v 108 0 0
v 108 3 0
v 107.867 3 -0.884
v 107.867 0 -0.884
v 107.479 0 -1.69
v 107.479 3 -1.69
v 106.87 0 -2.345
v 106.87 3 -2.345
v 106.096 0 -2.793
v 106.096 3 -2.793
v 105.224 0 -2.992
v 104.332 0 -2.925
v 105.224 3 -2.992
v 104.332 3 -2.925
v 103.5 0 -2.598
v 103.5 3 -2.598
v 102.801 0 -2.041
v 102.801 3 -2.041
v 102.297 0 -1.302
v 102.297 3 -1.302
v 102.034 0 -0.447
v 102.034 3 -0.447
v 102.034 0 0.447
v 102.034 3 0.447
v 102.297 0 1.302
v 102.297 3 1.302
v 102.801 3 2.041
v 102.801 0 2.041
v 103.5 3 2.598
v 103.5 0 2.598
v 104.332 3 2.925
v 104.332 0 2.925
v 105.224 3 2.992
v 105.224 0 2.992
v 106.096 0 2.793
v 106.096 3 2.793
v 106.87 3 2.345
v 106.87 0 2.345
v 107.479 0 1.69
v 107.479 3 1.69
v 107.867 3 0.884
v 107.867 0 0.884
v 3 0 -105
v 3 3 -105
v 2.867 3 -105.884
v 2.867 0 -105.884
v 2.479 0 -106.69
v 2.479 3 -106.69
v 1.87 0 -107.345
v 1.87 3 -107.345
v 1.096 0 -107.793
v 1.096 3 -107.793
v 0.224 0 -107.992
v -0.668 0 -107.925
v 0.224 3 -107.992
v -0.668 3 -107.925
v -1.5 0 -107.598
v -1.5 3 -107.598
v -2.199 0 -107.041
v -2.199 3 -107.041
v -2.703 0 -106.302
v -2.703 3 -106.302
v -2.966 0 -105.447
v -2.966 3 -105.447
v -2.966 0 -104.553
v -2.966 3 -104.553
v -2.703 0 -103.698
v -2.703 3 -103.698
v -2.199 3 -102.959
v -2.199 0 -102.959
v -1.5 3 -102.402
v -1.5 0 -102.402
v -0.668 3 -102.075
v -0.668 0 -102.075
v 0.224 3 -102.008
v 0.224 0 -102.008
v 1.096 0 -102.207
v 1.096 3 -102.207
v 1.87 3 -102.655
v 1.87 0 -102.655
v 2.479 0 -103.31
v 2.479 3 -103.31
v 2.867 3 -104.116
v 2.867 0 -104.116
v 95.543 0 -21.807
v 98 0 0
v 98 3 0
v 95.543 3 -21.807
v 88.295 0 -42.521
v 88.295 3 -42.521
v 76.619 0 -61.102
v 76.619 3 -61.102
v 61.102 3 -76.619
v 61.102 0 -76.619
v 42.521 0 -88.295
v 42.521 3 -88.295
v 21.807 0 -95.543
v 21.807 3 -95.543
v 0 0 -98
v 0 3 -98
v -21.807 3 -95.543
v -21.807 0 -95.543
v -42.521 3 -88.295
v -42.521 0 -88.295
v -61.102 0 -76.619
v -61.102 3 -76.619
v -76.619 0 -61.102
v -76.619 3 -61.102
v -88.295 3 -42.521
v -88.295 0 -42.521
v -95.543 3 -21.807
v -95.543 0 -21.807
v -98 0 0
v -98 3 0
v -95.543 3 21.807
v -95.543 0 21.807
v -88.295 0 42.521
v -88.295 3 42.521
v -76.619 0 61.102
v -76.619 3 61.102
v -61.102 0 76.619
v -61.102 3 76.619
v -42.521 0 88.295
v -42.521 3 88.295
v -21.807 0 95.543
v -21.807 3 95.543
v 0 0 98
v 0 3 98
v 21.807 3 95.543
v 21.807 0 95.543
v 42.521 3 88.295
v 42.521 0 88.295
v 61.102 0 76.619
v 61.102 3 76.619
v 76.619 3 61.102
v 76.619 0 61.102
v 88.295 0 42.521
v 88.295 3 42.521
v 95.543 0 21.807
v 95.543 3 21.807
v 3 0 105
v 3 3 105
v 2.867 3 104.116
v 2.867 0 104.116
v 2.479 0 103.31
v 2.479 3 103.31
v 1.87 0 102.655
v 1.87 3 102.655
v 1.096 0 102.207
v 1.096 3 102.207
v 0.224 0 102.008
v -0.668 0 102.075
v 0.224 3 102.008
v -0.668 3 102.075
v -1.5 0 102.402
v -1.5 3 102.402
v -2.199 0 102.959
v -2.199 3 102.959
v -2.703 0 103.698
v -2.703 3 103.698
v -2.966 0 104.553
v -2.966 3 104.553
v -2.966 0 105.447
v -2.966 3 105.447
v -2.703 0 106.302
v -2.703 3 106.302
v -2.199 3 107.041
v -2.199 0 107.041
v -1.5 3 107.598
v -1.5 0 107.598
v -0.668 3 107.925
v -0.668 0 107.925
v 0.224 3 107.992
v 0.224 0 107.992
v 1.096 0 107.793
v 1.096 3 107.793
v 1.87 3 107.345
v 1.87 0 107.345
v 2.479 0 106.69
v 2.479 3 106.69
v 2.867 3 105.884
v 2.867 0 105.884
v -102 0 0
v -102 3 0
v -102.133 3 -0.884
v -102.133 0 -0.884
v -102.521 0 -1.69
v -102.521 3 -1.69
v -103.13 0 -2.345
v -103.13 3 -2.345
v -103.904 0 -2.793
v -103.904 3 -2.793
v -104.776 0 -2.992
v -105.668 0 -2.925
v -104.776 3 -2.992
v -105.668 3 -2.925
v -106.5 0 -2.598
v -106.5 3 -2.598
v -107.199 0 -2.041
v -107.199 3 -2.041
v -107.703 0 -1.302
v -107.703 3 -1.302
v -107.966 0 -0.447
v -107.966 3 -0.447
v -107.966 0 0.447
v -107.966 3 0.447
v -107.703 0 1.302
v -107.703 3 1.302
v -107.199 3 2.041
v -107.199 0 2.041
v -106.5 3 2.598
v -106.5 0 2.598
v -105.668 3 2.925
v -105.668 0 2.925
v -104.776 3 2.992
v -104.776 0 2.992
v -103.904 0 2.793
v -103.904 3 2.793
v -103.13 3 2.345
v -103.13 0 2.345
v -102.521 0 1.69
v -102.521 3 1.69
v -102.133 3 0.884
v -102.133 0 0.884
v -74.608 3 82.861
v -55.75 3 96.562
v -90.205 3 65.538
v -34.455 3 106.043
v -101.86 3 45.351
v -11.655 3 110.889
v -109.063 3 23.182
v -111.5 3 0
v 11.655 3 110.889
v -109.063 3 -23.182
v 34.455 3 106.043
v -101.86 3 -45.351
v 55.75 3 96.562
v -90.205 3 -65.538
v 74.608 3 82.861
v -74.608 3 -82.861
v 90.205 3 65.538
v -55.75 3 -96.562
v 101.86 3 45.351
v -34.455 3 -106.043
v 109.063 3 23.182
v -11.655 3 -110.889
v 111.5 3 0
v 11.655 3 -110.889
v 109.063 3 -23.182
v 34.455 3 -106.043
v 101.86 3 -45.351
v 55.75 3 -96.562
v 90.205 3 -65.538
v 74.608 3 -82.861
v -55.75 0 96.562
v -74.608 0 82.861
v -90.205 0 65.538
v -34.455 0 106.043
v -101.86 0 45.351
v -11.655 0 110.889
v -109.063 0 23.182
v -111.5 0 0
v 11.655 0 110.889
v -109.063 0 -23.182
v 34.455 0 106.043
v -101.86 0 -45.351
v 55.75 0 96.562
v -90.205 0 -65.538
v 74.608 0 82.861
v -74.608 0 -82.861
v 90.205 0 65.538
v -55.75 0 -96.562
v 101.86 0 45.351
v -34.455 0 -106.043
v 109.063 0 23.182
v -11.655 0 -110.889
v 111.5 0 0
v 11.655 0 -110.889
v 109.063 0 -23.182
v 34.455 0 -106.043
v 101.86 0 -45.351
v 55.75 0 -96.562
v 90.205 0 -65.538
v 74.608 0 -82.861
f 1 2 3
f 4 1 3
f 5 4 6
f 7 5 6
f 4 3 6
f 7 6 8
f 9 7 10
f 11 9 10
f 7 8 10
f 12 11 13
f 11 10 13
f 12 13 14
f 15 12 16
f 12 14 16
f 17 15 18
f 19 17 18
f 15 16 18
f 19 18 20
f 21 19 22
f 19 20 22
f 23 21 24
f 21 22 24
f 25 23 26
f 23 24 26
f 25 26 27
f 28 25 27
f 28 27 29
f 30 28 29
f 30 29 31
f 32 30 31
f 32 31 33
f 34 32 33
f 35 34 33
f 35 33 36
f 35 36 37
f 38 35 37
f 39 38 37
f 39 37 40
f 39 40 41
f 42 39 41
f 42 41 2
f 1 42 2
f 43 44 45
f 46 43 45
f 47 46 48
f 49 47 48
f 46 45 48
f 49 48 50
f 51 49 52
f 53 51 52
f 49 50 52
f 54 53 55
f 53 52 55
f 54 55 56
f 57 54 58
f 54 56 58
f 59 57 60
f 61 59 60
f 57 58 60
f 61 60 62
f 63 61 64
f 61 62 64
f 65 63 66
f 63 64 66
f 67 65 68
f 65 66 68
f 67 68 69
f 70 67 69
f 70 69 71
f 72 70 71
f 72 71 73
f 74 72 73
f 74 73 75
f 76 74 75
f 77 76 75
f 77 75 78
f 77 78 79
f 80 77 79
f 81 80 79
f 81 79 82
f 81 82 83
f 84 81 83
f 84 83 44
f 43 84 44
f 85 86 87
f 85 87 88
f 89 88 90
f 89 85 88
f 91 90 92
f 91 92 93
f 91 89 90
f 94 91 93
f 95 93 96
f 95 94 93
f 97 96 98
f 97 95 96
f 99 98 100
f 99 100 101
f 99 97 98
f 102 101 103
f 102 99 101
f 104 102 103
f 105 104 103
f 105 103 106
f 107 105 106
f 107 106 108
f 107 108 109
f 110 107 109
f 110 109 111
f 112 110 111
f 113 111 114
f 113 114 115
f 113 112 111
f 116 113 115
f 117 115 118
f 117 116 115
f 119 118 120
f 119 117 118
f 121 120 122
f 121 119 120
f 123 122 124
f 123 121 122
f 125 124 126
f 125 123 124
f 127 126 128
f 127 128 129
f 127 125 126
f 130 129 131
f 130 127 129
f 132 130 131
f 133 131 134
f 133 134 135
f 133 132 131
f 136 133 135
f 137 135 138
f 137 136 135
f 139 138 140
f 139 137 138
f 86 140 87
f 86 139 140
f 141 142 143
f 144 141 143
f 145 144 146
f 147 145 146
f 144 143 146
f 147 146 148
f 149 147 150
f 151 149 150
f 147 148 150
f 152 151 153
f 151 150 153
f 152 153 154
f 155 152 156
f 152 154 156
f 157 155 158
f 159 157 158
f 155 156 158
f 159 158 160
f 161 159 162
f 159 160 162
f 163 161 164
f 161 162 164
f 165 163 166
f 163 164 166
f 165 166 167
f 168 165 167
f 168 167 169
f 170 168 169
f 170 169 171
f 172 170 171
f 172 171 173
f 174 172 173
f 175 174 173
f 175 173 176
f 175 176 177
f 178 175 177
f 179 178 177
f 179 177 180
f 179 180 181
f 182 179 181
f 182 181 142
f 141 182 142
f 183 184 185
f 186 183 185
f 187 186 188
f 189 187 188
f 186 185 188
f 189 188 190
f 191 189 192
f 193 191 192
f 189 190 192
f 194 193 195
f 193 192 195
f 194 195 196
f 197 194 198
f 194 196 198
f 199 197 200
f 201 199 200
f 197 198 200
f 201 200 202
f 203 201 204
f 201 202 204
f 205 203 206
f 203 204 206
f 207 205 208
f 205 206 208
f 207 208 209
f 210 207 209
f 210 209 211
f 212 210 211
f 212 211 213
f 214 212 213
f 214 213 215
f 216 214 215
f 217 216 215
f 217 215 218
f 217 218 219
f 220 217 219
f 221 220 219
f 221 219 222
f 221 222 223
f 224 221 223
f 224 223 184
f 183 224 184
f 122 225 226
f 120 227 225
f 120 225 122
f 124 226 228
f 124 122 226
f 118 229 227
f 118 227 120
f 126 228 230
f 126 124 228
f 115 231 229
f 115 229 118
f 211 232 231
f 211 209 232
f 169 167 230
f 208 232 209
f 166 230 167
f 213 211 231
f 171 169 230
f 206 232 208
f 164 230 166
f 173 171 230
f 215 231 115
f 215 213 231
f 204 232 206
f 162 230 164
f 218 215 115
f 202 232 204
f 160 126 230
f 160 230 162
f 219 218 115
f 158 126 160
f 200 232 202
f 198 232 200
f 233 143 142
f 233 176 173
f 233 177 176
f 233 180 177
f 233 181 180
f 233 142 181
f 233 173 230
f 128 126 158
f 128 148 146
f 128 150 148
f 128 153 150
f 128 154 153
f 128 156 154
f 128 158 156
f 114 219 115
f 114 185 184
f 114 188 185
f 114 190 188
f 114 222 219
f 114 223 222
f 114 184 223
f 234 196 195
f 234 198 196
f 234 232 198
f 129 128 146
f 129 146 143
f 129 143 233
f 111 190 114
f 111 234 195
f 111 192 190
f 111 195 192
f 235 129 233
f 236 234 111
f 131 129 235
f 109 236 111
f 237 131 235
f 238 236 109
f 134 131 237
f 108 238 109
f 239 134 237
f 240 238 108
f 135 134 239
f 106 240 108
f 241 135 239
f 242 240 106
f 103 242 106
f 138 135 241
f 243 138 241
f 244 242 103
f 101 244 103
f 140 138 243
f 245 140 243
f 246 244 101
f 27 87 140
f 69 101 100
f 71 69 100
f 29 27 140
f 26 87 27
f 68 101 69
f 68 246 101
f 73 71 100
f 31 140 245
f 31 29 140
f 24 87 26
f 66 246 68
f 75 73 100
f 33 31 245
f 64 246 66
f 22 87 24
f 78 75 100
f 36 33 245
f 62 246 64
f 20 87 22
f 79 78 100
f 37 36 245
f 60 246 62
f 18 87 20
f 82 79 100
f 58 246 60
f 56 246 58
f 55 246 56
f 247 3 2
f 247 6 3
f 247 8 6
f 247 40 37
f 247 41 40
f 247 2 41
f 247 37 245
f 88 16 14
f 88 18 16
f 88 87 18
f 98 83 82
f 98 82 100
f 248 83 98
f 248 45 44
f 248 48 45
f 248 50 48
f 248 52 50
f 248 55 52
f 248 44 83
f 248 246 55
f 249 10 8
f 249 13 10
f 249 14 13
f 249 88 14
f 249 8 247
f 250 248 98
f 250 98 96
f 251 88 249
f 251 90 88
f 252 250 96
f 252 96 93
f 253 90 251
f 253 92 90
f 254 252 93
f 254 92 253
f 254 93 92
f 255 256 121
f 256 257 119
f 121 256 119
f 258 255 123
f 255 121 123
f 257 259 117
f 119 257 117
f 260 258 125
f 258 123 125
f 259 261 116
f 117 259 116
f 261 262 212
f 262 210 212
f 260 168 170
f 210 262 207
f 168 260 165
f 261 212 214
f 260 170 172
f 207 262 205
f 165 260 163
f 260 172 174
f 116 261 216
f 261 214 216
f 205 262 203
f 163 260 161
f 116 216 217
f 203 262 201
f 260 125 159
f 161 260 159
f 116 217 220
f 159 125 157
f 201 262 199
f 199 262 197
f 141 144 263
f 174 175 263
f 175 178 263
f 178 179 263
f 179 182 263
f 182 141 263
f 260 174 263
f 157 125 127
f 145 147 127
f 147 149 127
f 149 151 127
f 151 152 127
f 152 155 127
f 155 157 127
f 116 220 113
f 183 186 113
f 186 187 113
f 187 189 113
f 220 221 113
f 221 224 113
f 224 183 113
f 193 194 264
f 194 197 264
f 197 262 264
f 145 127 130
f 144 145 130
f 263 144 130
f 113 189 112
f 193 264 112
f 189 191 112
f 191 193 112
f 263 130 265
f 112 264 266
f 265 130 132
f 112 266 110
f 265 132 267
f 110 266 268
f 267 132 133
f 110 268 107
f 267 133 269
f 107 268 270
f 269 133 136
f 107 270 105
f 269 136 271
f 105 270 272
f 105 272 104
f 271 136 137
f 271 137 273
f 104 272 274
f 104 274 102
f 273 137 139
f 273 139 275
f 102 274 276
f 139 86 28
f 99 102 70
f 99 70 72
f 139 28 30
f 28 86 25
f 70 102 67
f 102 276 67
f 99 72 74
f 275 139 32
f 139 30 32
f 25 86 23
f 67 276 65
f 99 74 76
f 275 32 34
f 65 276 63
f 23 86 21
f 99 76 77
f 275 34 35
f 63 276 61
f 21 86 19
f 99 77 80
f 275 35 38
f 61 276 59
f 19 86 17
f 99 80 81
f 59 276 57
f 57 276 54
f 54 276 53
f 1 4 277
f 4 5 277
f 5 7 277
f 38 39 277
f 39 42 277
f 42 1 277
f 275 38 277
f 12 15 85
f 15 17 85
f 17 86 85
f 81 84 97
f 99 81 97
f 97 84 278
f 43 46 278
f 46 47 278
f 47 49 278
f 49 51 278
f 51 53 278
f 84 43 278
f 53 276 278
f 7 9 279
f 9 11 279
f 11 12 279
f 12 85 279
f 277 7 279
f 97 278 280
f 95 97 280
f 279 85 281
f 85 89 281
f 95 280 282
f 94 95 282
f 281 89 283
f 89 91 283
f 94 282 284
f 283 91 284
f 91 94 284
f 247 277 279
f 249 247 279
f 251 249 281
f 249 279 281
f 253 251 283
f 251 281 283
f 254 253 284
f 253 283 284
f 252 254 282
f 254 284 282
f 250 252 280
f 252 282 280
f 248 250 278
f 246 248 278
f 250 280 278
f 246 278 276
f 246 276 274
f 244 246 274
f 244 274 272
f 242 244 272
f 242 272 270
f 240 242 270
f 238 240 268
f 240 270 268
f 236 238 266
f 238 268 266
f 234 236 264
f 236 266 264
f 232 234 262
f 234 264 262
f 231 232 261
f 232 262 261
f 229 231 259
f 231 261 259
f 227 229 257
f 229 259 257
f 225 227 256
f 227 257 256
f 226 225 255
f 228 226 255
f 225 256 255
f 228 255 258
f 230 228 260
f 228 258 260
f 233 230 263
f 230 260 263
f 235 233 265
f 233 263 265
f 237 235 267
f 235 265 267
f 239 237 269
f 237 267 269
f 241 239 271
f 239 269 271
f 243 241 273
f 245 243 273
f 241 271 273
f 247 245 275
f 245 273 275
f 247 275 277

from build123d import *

# Parameters (mm, degrees)
SKETCH1_R           = 111.5
SKETCH1_R_2         = 98
BOSS_EXTRUDE1_DEPTH = 3
SKETCH2_R           = 3
CUT_EXTRUDE1_DEPTH  = 4


with BuildPart() as part:
    # Sketch1 → Boss-Extrude1 (new body)
    with BuildSketch(Plane(origin=(0, 0, 0), x_dir=(1, 0, 0), z_dir=(0, 1, 0))):
        Circle(SKETCH1_R)
        Circle(SKETCH1_R_2, mode=Mode.SUBTRACT)
    extrude(amount=BOSS_EXTRUDE1_DEPTH)

    # Sketch2 → Cut-Extrude1 (cut, through all)
    with BuildSketch(Plane(origin=(0, 3, 0), x_dir=(1, 0, 0), z_dir=(0, 1, 0))):
        with Locations((0, 105)):
            Circle(SKETCH2_R)
        with Locations((105, 0)):
            Circle(SKETCH2_R)
        with Locations((0, -105)):
            Circle(SKETCH2_R)
        with Locations((-105, 0)):
            Circle(SKETCH2_R)
    extrude(amount=-CUT_EXTRUDE1_DEPTH, mode=Mode.SUBTRACT)


solid = part.part
